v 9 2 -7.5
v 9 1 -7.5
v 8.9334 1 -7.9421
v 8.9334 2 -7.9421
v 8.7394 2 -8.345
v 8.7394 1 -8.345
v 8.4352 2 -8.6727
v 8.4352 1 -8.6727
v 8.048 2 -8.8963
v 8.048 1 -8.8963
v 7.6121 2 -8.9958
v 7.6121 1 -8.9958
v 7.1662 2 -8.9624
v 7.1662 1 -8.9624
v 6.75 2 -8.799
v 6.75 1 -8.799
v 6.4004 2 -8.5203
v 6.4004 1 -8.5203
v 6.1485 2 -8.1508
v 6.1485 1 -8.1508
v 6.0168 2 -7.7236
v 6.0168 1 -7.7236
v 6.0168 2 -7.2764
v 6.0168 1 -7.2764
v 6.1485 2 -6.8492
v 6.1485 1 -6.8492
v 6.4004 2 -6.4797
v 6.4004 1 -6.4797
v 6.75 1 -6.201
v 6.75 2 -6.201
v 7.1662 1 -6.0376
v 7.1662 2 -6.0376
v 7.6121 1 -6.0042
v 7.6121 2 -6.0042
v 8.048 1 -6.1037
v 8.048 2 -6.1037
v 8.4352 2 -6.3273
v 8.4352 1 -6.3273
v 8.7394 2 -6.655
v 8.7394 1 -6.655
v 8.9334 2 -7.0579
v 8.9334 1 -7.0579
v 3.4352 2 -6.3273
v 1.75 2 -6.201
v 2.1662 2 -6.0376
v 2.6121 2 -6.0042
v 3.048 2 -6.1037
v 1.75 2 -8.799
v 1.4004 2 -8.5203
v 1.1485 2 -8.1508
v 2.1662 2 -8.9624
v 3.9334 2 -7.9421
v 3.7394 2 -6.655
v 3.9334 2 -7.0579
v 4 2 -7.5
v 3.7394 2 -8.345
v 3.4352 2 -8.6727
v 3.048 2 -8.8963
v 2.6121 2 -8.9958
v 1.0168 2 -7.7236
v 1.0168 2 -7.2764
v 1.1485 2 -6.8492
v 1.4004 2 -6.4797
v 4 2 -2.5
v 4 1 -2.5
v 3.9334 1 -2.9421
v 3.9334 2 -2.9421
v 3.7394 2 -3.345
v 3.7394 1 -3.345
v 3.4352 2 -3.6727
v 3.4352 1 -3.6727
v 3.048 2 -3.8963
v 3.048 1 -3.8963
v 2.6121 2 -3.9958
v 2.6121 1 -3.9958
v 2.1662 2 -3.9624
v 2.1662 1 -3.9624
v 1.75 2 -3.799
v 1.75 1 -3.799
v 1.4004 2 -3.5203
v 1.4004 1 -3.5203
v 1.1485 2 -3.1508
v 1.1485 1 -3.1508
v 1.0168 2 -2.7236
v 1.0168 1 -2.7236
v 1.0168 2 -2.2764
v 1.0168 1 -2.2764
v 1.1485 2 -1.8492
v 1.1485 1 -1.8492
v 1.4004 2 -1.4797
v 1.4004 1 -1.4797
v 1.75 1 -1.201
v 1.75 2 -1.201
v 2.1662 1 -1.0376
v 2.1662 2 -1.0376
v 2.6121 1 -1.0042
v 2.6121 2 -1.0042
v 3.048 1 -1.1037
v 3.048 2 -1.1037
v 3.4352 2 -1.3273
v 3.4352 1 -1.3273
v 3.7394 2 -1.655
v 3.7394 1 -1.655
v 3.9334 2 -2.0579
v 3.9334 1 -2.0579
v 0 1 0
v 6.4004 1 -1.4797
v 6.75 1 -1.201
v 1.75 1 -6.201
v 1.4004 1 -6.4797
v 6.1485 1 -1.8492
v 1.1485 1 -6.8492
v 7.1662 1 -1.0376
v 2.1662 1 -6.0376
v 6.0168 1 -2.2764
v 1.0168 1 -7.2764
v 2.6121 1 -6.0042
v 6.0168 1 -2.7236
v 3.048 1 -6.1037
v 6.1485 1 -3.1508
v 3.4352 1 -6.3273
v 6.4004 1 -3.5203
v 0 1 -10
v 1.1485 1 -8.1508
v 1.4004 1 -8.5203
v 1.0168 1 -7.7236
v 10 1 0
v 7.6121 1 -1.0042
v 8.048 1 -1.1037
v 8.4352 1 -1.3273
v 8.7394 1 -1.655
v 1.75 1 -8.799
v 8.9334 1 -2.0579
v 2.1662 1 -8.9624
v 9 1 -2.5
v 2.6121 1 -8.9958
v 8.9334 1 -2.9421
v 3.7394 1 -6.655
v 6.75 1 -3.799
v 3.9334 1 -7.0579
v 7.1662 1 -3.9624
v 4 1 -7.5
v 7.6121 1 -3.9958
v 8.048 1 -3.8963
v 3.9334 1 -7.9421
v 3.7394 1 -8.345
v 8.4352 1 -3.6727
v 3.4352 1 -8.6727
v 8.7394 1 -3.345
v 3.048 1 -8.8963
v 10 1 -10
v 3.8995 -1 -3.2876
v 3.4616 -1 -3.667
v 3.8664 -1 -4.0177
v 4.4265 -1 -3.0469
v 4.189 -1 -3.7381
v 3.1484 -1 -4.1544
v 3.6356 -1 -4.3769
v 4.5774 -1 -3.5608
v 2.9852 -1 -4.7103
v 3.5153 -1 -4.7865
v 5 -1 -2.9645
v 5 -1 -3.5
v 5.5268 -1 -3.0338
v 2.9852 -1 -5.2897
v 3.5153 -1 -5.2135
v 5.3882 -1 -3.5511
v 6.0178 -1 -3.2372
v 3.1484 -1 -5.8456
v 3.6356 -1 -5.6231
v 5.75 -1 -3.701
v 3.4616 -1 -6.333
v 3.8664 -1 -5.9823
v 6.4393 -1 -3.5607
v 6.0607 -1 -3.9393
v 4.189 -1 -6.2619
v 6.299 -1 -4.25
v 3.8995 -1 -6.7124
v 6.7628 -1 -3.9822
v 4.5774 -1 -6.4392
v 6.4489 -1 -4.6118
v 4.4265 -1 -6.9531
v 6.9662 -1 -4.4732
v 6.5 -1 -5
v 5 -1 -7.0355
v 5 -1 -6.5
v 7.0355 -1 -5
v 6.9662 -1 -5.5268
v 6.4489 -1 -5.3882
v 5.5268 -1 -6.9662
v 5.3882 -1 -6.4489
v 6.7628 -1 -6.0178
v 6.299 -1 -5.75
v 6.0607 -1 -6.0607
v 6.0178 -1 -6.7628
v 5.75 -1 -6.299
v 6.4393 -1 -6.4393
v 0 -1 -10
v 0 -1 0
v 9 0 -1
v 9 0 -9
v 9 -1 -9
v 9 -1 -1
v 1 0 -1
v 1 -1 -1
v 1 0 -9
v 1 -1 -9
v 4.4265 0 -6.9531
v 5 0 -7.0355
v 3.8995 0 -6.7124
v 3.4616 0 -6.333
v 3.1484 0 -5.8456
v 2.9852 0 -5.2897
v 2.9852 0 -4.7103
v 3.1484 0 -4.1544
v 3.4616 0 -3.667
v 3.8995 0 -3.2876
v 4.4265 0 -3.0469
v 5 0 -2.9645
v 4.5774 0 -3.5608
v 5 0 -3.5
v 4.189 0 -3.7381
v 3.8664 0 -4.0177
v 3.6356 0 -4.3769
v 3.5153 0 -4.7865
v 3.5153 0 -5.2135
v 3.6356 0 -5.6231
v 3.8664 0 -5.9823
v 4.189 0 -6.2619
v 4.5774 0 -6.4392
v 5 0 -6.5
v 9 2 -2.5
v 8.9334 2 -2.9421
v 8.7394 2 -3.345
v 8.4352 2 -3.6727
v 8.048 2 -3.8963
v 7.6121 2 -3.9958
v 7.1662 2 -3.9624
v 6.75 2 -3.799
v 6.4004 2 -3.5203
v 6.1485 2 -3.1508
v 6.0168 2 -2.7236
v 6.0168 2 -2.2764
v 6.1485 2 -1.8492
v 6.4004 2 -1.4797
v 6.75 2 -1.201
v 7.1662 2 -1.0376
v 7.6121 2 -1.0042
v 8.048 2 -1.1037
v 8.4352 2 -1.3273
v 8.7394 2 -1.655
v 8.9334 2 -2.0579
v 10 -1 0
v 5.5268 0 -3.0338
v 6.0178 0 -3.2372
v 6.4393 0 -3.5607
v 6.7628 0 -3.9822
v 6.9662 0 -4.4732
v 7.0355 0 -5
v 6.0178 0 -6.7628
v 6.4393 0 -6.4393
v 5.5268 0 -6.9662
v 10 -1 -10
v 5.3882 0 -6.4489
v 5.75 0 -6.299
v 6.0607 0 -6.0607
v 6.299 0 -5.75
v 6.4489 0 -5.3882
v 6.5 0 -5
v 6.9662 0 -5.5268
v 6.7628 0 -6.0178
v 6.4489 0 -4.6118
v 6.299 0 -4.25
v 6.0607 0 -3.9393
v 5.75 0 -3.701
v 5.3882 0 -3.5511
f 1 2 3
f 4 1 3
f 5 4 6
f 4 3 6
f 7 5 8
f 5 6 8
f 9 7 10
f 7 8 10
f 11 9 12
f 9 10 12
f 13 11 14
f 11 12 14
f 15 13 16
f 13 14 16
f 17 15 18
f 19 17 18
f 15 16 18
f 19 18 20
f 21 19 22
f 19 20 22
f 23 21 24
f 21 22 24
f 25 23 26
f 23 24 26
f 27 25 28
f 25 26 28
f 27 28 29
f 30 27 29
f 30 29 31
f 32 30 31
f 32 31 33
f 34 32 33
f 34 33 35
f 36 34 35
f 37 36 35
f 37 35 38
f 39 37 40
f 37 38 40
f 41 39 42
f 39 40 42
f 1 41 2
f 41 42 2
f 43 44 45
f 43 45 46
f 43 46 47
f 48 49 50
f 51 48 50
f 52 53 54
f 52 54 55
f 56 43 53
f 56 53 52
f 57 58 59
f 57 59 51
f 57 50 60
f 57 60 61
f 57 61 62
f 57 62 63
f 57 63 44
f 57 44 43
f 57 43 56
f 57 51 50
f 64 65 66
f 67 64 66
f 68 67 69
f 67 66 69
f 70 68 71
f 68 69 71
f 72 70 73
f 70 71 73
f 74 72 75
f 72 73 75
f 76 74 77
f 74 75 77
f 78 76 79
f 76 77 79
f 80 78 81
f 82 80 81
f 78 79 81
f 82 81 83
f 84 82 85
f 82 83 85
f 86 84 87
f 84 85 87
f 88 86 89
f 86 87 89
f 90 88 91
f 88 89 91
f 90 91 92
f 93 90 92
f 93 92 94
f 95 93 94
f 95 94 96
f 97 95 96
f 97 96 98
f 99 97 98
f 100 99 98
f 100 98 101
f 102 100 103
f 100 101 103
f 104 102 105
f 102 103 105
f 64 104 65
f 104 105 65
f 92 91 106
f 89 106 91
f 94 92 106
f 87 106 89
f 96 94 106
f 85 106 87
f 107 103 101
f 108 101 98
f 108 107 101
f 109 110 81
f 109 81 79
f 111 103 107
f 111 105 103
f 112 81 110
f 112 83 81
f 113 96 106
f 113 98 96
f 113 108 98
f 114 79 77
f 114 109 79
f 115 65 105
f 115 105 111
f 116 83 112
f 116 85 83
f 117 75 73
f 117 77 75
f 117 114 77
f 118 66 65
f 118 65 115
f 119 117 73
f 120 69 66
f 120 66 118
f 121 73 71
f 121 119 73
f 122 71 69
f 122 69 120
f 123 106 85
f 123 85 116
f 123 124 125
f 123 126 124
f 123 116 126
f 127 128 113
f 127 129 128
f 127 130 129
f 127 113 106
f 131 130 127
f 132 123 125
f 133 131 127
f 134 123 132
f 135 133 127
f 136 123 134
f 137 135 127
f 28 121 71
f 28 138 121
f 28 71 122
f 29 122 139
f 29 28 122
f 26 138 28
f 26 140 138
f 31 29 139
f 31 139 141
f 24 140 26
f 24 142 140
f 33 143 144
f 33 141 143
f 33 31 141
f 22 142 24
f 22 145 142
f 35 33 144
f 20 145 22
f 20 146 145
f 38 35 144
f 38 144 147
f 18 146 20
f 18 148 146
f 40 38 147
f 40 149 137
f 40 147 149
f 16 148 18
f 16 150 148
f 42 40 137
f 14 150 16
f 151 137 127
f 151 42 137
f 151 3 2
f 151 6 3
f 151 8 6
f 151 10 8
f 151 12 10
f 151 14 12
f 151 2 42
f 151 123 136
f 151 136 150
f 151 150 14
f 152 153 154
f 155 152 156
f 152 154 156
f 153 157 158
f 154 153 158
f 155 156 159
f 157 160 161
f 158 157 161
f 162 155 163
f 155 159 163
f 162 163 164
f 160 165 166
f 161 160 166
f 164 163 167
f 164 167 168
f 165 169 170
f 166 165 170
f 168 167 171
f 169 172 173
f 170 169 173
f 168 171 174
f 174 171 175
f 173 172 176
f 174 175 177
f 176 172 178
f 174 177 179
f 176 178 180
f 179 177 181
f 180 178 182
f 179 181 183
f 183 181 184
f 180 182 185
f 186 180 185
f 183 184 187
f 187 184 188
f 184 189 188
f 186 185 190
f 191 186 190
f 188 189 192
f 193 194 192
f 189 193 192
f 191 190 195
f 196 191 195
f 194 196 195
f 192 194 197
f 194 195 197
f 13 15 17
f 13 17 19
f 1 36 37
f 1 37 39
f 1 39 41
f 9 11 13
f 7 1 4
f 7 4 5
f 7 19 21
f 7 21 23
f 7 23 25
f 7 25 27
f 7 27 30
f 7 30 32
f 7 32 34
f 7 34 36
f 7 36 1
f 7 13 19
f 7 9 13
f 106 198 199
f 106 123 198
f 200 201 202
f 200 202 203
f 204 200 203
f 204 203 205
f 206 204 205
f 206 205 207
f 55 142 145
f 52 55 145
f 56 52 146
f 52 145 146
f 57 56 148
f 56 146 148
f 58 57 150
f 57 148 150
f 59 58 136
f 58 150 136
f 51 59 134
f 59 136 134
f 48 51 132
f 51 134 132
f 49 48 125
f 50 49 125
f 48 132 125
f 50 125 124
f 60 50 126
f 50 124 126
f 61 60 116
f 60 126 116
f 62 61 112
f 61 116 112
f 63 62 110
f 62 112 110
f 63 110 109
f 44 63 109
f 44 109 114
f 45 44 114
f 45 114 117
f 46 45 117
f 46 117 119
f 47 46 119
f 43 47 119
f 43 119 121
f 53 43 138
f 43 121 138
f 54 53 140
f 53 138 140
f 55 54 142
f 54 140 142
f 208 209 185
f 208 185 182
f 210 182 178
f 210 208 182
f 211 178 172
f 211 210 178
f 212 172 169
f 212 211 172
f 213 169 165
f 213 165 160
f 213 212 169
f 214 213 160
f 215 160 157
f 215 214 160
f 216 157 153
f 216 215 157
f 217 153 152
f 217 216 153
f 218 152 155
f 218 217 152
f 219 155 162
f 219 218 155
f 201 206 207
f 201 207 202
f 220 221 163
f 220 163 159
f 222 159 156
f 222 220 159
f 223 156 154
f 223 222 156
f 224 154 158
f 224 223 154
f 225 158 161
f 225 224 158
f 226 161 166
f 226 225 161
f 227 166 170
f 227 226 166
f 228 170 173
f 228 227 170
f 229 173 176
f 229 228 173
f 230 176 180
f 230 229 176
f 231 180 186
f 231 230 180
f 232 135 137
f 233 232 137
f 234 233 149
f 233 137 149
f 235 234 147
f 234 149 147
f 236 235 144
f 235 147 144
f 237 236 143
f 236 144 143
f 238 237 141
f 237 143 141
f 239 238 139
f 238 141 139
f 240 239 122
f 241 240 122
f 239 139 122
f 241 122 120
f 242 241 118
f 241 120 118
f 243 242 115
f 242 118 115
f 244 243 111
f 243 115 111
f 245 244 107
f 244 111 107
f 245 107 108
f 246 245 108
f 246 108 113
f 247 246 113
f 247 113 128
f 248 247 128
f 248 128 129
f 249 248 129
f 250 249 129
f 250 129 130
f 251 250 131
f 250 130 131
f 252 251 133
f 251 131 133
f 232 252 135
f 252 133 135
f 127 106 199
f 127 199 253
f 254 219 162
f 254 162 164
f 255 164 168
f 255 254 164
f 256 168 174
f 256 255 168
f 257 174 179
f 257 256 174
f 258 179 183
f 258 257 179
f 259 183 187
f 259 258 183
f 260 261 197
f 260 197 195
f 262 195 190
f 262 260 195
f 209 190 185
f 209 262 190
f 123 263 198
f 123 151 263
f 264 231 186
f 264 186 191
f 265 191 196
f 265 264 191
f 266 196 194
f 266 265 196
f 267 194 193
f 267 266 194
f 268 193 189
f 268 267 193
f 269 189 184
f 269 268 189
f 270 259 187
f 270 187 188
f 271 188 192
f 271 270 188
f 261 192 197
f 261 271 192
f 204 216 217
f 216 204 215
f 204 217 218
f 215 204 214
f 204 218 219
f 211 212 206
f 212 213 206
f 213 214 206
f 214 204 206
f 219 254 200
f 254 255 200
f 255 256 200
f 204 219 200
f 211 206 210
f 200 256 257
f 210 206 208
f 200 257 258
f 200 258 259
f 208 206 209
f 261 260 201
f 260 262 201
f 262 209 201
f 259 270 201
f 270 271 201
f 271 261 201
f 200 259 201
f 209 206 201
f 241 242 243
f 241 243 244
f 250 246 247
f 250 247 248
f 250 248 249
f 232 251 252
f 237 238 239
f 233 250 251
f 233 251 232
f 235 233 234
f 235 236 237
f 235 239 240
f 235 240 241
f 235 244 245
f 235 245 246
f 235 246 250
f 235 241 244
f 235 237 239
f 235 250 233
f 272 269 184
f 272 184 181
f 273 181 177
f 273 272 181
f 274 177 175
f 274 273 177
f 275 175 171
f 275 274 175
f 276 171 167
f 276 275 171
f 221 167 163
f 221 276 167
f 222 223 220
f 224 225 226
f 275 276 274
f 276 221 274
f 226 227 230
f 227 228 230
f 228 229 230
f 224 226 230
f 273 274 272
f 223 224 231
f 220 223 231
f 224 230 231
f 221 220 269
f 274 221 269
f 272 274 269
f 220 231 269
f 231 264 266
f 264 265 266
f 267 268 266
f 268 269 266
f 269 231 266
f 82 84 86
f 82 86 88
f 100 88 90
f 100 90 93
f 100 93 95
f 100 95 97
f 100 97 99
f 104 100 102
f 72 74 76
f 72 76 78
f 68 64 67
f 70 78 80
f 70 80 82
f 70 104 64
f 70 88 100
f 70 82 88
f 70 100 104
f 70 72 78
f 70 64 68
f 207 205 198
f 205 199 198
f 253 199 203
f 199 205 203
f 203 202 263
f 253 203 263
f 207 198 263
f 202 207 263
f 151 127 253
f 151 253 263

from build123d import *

# Parameters (mm, degrees)
SKETCH1_W           = 10
SKETCH1_H           = 10
BOSS_EXTRUDE1_DEPTH = 1
SKETCH1_4_W         = 10
SKETCH1_4_H         = 10
SKETCH1_4_W_2       = 8
SKETCH1_4_H_2       = 8
SKETCH1_4_R         = 2.035533906
SKETCH1_4_R_2       = 1.5
BOSS_EXTRUDE3_DEPTH = 1
SKETCH2_R           = 1.5
BOSS_EXTRUDE4_DEPTH = 1


with BuildPart() as part:
    # Sketch1 → Boss-Extrude1 (new body)
    with BuildSketch(Plane(origin=(0, 0, 0), x_dir=(1, 0, 0), z_dir=(0, 1, 0))):
        with Locations((5, 5)):
            Rectangle(SKETCH1_W, SKETCH1_H)
    extrude(amount=BOSS_EXTRUDE1_DEPTH)

    # Sketch1<4> → Boss-Extrude3 (add)
    # profile 1 of 2: a face of its own
    with BuildSketch(Plane(origin=(0, 0, 0), x_dir=(1, 0, 0), z_dir=(0, 1, 0))):
        with Locations((5, 5)):
            Rectangle(SKETCH1_4_W, SKETCH1_4_H)
        with Locations((5, 5)):
            Rectangle(SKETCH1_4_W_2, SKETCH1_4_H_2, mode=Mode.SUBTRACT)
    # profile 2 of 2: a face of its own
    with BuildSketch(Plane(origin=(0, 0, 0), x_dir=(1, 0, 0), z_dir=(0, 1, 0))):
        with Locations((5, 5)):
            Circle(SKETCH1_4_R)
        with Locations((5, 5)):
            Circle(SKETCH1_4_R_2, mode=Mode.SUBTRACT)
    extrude(amount=-BOSS_EXTRUDE3_DEPTH)

    # Sketch2 → Boss-Extrude4 (add)
    with BuildSketch(Plane(origin=(0, 1, 0), x_dir=(1, 0, 0), z_dir=(0, 1, 0))):
        with Locations((7.5, 2.5)):
            Circle(SKETCH2_R)
        with Locations((2.5, 2.5)):
            Circle(SKETCH2_R)
        with Locations((2.5, 7.5)):
            Circle(SKETCH2_R)
        with Locations((7.5, 7.5)):
            Circle(SKETCH2_R)
    extrude(amount=BOSS_EXTRUDE4_DEPTH)


solid = part.part
